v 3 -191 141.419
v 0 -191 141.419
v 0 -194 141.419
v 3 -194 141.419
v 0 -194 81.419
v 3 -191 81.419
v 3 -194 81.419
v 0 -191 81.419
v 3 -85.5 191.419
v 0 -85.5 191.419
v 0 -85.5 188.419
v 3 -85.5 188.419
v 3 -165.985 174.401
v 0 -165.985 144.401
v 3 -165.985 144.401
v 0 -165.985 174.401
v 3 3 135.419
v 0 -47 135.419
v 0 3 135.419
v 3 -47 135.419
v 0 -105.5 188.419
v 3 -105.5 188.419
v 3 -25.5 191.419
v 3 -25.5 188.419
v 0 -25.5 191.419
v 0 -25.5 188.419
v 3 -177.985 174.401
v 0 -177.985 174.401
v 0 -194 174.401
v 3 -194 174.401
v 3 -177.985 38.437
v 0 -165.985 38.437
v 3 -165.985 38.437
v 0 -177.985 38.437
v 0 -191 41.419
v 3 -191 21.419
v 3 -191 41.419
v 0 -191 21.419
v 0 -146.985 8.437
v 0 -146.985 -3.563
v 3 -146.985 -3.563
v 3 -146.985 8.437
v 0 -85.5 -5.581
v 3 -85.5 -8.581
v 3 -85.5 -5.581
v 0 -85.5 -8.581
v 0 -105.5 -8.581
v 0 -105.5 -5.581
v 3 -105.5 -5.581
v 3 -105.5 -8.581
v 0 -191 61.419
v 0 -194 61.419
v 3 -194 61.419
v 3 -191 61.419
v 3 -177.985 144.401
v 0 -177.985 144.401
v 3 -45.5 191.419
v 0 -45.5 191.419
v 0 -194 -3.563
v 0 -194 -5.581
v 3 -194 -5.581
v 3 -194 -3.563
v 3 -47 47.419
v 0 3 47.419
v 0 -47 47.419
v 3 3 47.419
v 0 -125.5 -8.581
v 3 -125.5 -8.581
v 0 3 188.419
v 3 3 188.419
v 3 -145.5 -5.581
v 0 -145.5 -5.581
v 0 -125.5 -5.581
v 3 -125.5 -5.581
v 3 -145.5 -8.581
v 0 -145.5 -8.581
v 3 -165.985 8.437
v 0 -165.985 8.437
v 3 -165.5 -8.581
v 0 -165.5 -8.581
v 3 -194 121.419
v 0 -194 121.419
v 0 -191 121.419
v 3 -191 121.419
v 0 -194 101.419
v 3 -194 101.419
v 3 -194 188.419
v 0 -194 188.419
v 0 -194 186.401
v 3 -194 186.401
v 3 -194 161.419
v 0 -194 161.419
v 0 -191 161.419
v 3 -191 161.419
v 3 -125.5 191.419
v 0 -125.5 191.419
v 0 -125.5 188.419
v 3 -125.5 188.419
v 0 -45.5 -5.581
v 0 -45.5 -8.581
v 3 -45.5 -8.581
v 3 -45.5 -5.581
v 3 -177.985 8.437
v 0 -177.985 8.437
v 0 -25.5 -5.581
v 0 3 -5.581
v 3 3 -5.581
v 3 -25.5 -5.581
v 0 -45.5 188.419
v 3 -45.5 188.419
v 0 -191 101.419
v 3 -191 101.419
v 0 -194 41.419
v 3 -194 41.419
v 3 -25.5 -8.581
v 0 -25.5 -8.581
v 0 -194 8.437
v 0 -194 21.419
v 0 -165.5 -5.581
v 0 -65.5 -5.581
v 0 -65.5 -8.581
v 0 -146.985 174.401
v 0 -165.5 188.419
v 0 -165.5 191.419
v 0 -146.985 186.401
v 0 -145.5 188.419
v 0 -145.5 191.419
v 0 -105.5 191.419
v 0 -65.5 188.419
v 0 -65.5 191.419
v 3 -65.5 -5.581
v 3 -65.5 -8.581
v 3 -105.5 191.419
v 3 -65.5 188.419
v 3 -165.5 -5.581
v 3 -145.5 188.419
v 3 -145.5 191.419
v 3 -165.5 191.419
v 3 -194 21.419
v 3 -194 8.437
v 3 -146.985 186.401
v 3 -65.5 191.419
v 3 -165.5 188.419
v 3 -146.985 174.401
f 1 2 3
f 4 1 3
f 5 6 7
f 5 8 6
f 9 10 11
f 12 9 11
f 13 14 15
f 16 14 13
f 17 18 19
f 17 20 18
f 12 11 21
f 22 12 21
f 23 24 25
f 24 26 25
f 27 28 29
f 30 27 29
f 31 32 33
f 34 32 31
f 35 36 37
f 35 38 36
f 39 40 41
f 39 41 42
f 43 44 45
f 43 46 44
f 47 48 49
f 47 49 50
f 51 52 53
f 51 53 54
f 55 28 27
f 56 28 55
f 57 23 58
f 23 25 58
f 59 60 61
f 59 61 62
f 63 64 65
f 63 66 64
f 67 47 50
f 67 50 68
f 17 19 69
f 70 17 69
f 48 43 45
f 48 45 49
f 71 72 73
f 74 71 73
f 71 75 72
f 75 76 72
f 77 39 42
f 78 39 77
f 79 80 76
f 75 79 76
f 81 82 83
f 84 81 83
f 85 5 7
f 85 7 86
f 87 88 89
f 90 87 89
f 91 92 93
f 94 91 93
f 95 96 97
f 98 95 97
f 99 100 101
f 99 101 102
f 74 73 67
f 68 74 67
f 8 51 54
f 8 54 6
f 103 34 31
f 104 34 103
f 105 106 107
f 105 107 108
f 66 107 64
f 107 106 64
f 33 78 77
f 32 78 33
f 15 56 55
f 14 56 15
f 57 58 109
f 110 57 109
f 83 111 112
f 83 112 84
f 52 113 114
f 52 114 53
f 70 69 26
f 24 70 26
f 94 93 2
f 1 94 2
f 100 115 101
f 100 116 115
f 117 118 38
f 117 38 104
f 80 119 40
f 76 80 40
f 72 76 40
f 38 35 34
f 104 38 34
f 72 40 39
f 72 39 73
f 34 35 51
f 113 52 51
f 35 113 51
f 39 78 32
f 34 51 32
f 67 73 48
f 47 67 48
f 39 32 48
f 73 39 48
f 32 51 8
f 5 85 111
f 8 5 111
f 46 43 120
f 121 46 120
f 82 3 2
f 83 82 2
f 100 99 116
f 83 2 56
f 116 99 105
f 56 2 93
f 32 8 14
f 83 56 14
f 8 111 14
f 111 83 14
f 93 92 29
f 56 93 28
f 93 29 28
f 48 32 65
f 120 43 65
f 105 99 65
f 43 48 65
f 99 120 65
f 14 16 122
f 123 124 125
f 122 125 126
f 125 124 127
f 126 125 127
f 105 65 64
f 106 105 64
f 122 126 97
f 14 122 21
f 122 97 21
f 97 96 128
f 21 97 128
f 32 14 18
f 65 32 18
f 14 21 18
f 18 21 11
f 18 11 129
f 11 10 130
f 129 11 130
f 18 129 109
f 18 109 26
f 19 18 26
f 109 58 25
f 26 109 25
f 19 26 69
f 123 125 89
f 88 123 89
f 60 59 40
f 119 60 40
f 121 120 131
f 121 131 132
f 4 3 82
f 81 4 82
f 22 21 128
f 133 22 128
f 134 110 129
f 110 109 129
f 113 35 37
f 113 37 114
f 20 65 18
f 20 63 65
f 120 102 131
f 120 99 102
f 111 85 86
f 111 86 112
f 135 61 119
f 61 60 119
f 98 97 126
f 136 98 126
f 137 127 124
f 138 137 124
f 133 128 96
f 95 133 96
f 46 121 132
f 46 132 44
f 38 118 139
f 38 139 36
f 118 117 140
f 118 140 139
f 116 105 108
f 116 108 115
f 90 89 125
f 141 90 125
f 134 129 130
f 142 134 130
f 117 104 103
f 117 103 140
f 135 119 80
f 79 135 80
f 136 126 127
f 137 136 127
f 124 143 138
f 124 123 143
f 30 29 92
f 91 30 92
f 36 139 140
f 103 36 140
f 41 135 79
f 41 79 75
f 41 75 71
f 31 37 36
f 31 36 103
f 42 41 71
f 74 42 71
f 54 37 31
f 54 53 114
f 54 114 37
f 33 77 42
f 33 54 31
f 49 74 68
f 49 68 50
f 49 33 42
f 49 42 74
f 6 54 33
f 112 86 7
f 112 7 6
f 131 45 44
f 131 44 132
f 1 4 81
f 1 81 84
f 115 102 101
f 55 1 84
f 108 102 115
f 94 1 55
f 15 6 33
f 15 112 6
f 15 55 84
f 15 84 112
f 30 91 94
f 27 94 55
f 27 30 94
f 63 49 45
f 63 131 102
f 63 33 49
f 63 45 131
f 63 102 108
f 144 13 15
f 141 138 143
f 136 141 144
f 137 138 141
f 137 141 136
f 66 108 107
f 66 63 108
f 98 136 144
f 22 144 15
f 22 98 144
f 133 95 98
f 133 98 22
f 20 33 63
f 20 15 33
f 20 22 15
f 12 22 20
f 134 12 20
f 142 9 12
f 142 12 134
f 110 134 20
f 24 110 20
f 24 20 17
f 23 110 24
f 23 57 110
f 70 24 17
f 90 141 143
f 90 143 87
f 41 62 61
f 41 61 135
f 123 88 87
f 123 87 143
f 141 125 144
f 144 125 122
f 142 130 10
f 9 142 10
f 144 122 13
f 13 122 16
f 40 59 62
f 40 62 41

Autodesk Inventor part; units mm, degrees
ref_plane "YZ Plane" through (0, 0, 0) normal (1, 0, 0) x (0, 1, 0)
ref_plane "XZ Plane" through (0, 0, 0) normal (0, 1, 0) x (-1, 0, 0)
ref_plane "XY Plane" through (0, 0, 0) normal (0, 0, 1) x (1, 0, 0)
sketch "Sketch1" plane through (0, 0, 0) normal (1, 0, 0) x (0, 1, 0)
  line L0 (3, 191.4188) -> (-194, 191.4188) construction
  line L1 (-194, 191.4188) -> (-194, -8.5812) construction
  line L2 (-194, -8.5812) -> (3, -8.5812) construction
  line L3 (3, -8.5812) -> (3, 191.4188) construction
  line L4 (0, 188.4188) -> (-191, 188.4188) construction
  line L5 (-191, 188.4188) -> (-191, -5.5812) construction
  line L6 (-191, -5.5812) -> (0, -5.5812) construction
  line L7 (0, -5.5812) -> (0, 188.4188) construction
  line L8 (-165.5, -5.5812) -> (-165.5, -8.5812) construction
  line L9 (-194, -5.5812) -> (-165.5, -5.5812)
  line L10 (-165.5, -5.5812) -> (-165.5, -8.5812)
  line L11 (-165.5, -8.5812) -> (-145.5, -8.5812)
  line L12 (-145.5, -8.5812) -> (-145.5, -5.5812)
  line L13 (-145.5, -5.5812) -> (-125.5, -5.5812)
  line L14 (-125.5, -5.5812) -> (-125.5, -8.5812)
  line L15 (3, -5.5812) -> (-25.5, -5.5812)
  line L16 (-25.5, -5.5812) -> (-25.5, -8.5812)
  line L17 (-25.5, -8.5812) -> (-45.5, -8.5812)
  line L18 (-45.5, -8.5812) -> (-45.5, -5.5812)
  line L19 (-45.5, -5.5812) -> (-65.5, -5.5812)
  line L20 (-65.5, -5.5812) -> (-65.5, -8.5812)
  line L21 (-65.5, -8.5812) -> (-85.5, -8.5812)
  line L22 (-85.5, -8.5812) -> (-85.5, -5.5812)
  line L23 (-85.5, -5.5812) -> (-105.5, -5.5812)
  line L24 (-105.5, -5.5812) -> (-105.5, -8.5812)
  line L25 (-105.5, -8.5812) -> (-125.5, -8.5812)
  line L26 (-194, 188.4188) -> (-165.5, 188.4188)
  line L27 (-165.5, 188.4188) -> (-165.5, 191.4188)
  line L28 (3, 188.4188) -> (-25.5, 188.4188)
  line L29 (-25.5, 188.4188) -> (-25.5, 191.4188)
  line L30 (-25.5, 191.4188) -> (-45.5, 191.4188)
  line L31 (-45.5, 191.4188) -> (-45.5, 188.4188)
  line L32 (-45.5, 188.4188) -> (-65.5, 188.4188)
  line L33 (-65.5, 188.4188) -> (-65.5, 191.4188)
  line L34 (-65.5, 191.4188) -> (-85.5, 191.4188)
  line L35 (-85.5, 191.4188) -> (-85.5, 188.4188)
  line L36 (-85.5, 188.4188) -> (-105.5, 188.4188)
  line L37 (-105.5, 188.4188) -> (-105.5, 191.4188)
  line L38 (-105.5, 191.4188) -> (-125.5, 191.4188)
  line L39 (-125.5, 191.4188) -> (-125.5, 188.4188)
  line L40 (-125.5, 188.4188) -> (-145.5, 188.4188)
  line L41 (-145.5, 188.4188) -> (-145.5, 191.4188)
  line L42 (-145.5, 191.4188) -> (-165.5, 191.4188)
  line L43 (-194, 188.4188) -> (-194, 161.4188)
  line L44 (-194, 161.4188) -> (-191, 161.4188)
  line L45 (-191, 161.4188) -> (-191, 141.4188)
  line L46 (-191, 141.4188) -> (-194, 141.4188)
  line L47 (-194, 141.4188) -> (-194, 121.4188)
  line L48 (-194, 121.4188) -> (-191, 121.4188)
  line L49 (-194, -5.5812) -> (-194, 21.4188)
  line L50 (-194, 21.4188) -> (-191, 21.4188)
  line L51 (-191, 21.4188) -> (-191, 41.4188)
  line L52 (-191, 41.4188) -> (-194, 41.4188)
  line L53 (-194, 41.4188) -> (-194, 61.4188)
  line L54 (-194, 61.4188) -> (-191, 61.4188)
  line L55 (-191, 61.4188) -> (-191, 81.4188)
  line L56 (-191, 81.4188) -> (-194, 81.4188)
  line L57 (-194, 81.4188) -> (-194, 101.4188)
  line L58 (-194, 101.4188) -> (-191, 101.4188)
  line L59 (-191, 101.4188) -> (-191, 121.4188)
  line L60 (3, -5.5812) -> (3, 188.4188)
  line L61 (-194, 186.4008) -> (-146.985, 186.4008)
  line L62 (-146.985, 186.4008) -> (-146.985, 174.4008)
  line L63 (-177.985, 174.4008) -> (-177.985, 144.4008)
  line L64 (-177.985, 144.4008) -> (-165.985, 144.4008)
  line L65 (-165.985, 144.4008) -> (-165.985, 174.4008)
  line L66 (-194, -3.5632) -> (-146.985, -3.5632)
  line L67 (-146.985, -3.5632) -> (-146.985, 8.4368)
  line L68 (-146.985, 8.4368) -> (-165.985, 8.4368)
  line L69 (-165.985, 8.4368) -> (-165.985, 38.4368)
  line L70 (-165.985, 38.4368) -> (-177.985, 38.4368)
  line L71 (-177.985, 38.4368) -> (-177.985, 8.4368)
  line L72 (-177.985, 8.4368) -> (-194, 8.4368)
  line L73 (-177.985, 174.4008) -> (-194, 174.4008)
  line L74 (-146.985, 174.4008) -> (-165.985, 174.4008)
  point P0 (0, 0)
  point P1 (-170.4925, 186.4008)
  point P2 (-194, 174.9188)
  dimension "d0" = 197
  dimension "d1" = 200
  dimension "d2" = 3
  dimension "d3" = 3
  dimension "d4" = 3
  dimension "d5" = 3
  dimension "d6" = 3
  dimension "d7" = 3
  dimension "d8" = 3
  dimension "d9" = 3
  dimension "d11" = 28.5
  dimension "d12" = 20
  dimension "d13" = 20
  dimension "d14" = 28.5
  dimension "d15" = 20
  dimension "d16" = 20
  dimension "d17" = 20
  dimension "d18" = 20
  dimension "d19" = 28.5
  dimension "d20" = 28.5
  dimension "d21" = 20
  dimension "d22" = 20
  dimension "d23" = 20
  dimension "d24" = 20
  dimension "d25" = 20
  dimension "d26" = 20
  dimension "d27" = 27
  dimension "d28" = 20
  dimension "d29" = 20
  dimension "d30" = 27
  dimension "d31" = 20
  dimension "d32" = 20
  dimension "d33" = 20
  dimension "d34" = 20
  dimension "d35" = 5.018
  dimension "d37" = 47.015
  dimension "d38" = 12
  dimension "d39" = 19
  dimension "d40" = 30
  dimension "d41" = 12
  dimension "d42" = 16.015
  dimension "d43" = 5.018
  dimension "d47" = 47.015
  dimension "d48" = 30
  dimension "d49" = 12
  dimension "d50" = 12
  dimension "d51" = 19
  dimension "d52" = 16.015
extrude "Extrusion1" add sketch "Sketch1" along normal blind 3 contours L49 L66 L67 L68 L69 L70 L71 L72 L50 L51 L52 L53 L54 L55 L56 L57 L58 L59 L48 L47 L46 L45 L44 L43 L73 L63 L64 L65 L74 L62 L61 L26 L27 L42 L41 L40 L39 L38 L37 L36 L35 L34 L33 L32 L31 L30 L29 L28 L60 L15 L16 L17 L18 L19 L20 L21 L22 L23 L24 L25 L14 L13 L12 L11 L10 L9
sketch "Sketch2" plane through (3, 0, 0) normal (1, 0, 0) x (0, 0, -1)
  line L0 (5.5812, 3) -> (-188.4188, 3) projected
  line L1 (-135.4188, 3) -> (-47.4188, 3)
  line L2 (-47.4188, 3) -> (-47.4188, -47)
  line L3 (-47.4188, -47) -> (-135.4188, -47)
  line L4 (-135.4188, -47) -> (-135.4188, 3)
  point P0 (0, 0)
  dimension "d58" = 50
  dimension "d59" = 88
  dimension "d60" = 53
  dimension "d61" = 53
extrude "Extrusion2" cut sketch "Sketch2" against normal blind 10
properties part number "outisdewall_right"
